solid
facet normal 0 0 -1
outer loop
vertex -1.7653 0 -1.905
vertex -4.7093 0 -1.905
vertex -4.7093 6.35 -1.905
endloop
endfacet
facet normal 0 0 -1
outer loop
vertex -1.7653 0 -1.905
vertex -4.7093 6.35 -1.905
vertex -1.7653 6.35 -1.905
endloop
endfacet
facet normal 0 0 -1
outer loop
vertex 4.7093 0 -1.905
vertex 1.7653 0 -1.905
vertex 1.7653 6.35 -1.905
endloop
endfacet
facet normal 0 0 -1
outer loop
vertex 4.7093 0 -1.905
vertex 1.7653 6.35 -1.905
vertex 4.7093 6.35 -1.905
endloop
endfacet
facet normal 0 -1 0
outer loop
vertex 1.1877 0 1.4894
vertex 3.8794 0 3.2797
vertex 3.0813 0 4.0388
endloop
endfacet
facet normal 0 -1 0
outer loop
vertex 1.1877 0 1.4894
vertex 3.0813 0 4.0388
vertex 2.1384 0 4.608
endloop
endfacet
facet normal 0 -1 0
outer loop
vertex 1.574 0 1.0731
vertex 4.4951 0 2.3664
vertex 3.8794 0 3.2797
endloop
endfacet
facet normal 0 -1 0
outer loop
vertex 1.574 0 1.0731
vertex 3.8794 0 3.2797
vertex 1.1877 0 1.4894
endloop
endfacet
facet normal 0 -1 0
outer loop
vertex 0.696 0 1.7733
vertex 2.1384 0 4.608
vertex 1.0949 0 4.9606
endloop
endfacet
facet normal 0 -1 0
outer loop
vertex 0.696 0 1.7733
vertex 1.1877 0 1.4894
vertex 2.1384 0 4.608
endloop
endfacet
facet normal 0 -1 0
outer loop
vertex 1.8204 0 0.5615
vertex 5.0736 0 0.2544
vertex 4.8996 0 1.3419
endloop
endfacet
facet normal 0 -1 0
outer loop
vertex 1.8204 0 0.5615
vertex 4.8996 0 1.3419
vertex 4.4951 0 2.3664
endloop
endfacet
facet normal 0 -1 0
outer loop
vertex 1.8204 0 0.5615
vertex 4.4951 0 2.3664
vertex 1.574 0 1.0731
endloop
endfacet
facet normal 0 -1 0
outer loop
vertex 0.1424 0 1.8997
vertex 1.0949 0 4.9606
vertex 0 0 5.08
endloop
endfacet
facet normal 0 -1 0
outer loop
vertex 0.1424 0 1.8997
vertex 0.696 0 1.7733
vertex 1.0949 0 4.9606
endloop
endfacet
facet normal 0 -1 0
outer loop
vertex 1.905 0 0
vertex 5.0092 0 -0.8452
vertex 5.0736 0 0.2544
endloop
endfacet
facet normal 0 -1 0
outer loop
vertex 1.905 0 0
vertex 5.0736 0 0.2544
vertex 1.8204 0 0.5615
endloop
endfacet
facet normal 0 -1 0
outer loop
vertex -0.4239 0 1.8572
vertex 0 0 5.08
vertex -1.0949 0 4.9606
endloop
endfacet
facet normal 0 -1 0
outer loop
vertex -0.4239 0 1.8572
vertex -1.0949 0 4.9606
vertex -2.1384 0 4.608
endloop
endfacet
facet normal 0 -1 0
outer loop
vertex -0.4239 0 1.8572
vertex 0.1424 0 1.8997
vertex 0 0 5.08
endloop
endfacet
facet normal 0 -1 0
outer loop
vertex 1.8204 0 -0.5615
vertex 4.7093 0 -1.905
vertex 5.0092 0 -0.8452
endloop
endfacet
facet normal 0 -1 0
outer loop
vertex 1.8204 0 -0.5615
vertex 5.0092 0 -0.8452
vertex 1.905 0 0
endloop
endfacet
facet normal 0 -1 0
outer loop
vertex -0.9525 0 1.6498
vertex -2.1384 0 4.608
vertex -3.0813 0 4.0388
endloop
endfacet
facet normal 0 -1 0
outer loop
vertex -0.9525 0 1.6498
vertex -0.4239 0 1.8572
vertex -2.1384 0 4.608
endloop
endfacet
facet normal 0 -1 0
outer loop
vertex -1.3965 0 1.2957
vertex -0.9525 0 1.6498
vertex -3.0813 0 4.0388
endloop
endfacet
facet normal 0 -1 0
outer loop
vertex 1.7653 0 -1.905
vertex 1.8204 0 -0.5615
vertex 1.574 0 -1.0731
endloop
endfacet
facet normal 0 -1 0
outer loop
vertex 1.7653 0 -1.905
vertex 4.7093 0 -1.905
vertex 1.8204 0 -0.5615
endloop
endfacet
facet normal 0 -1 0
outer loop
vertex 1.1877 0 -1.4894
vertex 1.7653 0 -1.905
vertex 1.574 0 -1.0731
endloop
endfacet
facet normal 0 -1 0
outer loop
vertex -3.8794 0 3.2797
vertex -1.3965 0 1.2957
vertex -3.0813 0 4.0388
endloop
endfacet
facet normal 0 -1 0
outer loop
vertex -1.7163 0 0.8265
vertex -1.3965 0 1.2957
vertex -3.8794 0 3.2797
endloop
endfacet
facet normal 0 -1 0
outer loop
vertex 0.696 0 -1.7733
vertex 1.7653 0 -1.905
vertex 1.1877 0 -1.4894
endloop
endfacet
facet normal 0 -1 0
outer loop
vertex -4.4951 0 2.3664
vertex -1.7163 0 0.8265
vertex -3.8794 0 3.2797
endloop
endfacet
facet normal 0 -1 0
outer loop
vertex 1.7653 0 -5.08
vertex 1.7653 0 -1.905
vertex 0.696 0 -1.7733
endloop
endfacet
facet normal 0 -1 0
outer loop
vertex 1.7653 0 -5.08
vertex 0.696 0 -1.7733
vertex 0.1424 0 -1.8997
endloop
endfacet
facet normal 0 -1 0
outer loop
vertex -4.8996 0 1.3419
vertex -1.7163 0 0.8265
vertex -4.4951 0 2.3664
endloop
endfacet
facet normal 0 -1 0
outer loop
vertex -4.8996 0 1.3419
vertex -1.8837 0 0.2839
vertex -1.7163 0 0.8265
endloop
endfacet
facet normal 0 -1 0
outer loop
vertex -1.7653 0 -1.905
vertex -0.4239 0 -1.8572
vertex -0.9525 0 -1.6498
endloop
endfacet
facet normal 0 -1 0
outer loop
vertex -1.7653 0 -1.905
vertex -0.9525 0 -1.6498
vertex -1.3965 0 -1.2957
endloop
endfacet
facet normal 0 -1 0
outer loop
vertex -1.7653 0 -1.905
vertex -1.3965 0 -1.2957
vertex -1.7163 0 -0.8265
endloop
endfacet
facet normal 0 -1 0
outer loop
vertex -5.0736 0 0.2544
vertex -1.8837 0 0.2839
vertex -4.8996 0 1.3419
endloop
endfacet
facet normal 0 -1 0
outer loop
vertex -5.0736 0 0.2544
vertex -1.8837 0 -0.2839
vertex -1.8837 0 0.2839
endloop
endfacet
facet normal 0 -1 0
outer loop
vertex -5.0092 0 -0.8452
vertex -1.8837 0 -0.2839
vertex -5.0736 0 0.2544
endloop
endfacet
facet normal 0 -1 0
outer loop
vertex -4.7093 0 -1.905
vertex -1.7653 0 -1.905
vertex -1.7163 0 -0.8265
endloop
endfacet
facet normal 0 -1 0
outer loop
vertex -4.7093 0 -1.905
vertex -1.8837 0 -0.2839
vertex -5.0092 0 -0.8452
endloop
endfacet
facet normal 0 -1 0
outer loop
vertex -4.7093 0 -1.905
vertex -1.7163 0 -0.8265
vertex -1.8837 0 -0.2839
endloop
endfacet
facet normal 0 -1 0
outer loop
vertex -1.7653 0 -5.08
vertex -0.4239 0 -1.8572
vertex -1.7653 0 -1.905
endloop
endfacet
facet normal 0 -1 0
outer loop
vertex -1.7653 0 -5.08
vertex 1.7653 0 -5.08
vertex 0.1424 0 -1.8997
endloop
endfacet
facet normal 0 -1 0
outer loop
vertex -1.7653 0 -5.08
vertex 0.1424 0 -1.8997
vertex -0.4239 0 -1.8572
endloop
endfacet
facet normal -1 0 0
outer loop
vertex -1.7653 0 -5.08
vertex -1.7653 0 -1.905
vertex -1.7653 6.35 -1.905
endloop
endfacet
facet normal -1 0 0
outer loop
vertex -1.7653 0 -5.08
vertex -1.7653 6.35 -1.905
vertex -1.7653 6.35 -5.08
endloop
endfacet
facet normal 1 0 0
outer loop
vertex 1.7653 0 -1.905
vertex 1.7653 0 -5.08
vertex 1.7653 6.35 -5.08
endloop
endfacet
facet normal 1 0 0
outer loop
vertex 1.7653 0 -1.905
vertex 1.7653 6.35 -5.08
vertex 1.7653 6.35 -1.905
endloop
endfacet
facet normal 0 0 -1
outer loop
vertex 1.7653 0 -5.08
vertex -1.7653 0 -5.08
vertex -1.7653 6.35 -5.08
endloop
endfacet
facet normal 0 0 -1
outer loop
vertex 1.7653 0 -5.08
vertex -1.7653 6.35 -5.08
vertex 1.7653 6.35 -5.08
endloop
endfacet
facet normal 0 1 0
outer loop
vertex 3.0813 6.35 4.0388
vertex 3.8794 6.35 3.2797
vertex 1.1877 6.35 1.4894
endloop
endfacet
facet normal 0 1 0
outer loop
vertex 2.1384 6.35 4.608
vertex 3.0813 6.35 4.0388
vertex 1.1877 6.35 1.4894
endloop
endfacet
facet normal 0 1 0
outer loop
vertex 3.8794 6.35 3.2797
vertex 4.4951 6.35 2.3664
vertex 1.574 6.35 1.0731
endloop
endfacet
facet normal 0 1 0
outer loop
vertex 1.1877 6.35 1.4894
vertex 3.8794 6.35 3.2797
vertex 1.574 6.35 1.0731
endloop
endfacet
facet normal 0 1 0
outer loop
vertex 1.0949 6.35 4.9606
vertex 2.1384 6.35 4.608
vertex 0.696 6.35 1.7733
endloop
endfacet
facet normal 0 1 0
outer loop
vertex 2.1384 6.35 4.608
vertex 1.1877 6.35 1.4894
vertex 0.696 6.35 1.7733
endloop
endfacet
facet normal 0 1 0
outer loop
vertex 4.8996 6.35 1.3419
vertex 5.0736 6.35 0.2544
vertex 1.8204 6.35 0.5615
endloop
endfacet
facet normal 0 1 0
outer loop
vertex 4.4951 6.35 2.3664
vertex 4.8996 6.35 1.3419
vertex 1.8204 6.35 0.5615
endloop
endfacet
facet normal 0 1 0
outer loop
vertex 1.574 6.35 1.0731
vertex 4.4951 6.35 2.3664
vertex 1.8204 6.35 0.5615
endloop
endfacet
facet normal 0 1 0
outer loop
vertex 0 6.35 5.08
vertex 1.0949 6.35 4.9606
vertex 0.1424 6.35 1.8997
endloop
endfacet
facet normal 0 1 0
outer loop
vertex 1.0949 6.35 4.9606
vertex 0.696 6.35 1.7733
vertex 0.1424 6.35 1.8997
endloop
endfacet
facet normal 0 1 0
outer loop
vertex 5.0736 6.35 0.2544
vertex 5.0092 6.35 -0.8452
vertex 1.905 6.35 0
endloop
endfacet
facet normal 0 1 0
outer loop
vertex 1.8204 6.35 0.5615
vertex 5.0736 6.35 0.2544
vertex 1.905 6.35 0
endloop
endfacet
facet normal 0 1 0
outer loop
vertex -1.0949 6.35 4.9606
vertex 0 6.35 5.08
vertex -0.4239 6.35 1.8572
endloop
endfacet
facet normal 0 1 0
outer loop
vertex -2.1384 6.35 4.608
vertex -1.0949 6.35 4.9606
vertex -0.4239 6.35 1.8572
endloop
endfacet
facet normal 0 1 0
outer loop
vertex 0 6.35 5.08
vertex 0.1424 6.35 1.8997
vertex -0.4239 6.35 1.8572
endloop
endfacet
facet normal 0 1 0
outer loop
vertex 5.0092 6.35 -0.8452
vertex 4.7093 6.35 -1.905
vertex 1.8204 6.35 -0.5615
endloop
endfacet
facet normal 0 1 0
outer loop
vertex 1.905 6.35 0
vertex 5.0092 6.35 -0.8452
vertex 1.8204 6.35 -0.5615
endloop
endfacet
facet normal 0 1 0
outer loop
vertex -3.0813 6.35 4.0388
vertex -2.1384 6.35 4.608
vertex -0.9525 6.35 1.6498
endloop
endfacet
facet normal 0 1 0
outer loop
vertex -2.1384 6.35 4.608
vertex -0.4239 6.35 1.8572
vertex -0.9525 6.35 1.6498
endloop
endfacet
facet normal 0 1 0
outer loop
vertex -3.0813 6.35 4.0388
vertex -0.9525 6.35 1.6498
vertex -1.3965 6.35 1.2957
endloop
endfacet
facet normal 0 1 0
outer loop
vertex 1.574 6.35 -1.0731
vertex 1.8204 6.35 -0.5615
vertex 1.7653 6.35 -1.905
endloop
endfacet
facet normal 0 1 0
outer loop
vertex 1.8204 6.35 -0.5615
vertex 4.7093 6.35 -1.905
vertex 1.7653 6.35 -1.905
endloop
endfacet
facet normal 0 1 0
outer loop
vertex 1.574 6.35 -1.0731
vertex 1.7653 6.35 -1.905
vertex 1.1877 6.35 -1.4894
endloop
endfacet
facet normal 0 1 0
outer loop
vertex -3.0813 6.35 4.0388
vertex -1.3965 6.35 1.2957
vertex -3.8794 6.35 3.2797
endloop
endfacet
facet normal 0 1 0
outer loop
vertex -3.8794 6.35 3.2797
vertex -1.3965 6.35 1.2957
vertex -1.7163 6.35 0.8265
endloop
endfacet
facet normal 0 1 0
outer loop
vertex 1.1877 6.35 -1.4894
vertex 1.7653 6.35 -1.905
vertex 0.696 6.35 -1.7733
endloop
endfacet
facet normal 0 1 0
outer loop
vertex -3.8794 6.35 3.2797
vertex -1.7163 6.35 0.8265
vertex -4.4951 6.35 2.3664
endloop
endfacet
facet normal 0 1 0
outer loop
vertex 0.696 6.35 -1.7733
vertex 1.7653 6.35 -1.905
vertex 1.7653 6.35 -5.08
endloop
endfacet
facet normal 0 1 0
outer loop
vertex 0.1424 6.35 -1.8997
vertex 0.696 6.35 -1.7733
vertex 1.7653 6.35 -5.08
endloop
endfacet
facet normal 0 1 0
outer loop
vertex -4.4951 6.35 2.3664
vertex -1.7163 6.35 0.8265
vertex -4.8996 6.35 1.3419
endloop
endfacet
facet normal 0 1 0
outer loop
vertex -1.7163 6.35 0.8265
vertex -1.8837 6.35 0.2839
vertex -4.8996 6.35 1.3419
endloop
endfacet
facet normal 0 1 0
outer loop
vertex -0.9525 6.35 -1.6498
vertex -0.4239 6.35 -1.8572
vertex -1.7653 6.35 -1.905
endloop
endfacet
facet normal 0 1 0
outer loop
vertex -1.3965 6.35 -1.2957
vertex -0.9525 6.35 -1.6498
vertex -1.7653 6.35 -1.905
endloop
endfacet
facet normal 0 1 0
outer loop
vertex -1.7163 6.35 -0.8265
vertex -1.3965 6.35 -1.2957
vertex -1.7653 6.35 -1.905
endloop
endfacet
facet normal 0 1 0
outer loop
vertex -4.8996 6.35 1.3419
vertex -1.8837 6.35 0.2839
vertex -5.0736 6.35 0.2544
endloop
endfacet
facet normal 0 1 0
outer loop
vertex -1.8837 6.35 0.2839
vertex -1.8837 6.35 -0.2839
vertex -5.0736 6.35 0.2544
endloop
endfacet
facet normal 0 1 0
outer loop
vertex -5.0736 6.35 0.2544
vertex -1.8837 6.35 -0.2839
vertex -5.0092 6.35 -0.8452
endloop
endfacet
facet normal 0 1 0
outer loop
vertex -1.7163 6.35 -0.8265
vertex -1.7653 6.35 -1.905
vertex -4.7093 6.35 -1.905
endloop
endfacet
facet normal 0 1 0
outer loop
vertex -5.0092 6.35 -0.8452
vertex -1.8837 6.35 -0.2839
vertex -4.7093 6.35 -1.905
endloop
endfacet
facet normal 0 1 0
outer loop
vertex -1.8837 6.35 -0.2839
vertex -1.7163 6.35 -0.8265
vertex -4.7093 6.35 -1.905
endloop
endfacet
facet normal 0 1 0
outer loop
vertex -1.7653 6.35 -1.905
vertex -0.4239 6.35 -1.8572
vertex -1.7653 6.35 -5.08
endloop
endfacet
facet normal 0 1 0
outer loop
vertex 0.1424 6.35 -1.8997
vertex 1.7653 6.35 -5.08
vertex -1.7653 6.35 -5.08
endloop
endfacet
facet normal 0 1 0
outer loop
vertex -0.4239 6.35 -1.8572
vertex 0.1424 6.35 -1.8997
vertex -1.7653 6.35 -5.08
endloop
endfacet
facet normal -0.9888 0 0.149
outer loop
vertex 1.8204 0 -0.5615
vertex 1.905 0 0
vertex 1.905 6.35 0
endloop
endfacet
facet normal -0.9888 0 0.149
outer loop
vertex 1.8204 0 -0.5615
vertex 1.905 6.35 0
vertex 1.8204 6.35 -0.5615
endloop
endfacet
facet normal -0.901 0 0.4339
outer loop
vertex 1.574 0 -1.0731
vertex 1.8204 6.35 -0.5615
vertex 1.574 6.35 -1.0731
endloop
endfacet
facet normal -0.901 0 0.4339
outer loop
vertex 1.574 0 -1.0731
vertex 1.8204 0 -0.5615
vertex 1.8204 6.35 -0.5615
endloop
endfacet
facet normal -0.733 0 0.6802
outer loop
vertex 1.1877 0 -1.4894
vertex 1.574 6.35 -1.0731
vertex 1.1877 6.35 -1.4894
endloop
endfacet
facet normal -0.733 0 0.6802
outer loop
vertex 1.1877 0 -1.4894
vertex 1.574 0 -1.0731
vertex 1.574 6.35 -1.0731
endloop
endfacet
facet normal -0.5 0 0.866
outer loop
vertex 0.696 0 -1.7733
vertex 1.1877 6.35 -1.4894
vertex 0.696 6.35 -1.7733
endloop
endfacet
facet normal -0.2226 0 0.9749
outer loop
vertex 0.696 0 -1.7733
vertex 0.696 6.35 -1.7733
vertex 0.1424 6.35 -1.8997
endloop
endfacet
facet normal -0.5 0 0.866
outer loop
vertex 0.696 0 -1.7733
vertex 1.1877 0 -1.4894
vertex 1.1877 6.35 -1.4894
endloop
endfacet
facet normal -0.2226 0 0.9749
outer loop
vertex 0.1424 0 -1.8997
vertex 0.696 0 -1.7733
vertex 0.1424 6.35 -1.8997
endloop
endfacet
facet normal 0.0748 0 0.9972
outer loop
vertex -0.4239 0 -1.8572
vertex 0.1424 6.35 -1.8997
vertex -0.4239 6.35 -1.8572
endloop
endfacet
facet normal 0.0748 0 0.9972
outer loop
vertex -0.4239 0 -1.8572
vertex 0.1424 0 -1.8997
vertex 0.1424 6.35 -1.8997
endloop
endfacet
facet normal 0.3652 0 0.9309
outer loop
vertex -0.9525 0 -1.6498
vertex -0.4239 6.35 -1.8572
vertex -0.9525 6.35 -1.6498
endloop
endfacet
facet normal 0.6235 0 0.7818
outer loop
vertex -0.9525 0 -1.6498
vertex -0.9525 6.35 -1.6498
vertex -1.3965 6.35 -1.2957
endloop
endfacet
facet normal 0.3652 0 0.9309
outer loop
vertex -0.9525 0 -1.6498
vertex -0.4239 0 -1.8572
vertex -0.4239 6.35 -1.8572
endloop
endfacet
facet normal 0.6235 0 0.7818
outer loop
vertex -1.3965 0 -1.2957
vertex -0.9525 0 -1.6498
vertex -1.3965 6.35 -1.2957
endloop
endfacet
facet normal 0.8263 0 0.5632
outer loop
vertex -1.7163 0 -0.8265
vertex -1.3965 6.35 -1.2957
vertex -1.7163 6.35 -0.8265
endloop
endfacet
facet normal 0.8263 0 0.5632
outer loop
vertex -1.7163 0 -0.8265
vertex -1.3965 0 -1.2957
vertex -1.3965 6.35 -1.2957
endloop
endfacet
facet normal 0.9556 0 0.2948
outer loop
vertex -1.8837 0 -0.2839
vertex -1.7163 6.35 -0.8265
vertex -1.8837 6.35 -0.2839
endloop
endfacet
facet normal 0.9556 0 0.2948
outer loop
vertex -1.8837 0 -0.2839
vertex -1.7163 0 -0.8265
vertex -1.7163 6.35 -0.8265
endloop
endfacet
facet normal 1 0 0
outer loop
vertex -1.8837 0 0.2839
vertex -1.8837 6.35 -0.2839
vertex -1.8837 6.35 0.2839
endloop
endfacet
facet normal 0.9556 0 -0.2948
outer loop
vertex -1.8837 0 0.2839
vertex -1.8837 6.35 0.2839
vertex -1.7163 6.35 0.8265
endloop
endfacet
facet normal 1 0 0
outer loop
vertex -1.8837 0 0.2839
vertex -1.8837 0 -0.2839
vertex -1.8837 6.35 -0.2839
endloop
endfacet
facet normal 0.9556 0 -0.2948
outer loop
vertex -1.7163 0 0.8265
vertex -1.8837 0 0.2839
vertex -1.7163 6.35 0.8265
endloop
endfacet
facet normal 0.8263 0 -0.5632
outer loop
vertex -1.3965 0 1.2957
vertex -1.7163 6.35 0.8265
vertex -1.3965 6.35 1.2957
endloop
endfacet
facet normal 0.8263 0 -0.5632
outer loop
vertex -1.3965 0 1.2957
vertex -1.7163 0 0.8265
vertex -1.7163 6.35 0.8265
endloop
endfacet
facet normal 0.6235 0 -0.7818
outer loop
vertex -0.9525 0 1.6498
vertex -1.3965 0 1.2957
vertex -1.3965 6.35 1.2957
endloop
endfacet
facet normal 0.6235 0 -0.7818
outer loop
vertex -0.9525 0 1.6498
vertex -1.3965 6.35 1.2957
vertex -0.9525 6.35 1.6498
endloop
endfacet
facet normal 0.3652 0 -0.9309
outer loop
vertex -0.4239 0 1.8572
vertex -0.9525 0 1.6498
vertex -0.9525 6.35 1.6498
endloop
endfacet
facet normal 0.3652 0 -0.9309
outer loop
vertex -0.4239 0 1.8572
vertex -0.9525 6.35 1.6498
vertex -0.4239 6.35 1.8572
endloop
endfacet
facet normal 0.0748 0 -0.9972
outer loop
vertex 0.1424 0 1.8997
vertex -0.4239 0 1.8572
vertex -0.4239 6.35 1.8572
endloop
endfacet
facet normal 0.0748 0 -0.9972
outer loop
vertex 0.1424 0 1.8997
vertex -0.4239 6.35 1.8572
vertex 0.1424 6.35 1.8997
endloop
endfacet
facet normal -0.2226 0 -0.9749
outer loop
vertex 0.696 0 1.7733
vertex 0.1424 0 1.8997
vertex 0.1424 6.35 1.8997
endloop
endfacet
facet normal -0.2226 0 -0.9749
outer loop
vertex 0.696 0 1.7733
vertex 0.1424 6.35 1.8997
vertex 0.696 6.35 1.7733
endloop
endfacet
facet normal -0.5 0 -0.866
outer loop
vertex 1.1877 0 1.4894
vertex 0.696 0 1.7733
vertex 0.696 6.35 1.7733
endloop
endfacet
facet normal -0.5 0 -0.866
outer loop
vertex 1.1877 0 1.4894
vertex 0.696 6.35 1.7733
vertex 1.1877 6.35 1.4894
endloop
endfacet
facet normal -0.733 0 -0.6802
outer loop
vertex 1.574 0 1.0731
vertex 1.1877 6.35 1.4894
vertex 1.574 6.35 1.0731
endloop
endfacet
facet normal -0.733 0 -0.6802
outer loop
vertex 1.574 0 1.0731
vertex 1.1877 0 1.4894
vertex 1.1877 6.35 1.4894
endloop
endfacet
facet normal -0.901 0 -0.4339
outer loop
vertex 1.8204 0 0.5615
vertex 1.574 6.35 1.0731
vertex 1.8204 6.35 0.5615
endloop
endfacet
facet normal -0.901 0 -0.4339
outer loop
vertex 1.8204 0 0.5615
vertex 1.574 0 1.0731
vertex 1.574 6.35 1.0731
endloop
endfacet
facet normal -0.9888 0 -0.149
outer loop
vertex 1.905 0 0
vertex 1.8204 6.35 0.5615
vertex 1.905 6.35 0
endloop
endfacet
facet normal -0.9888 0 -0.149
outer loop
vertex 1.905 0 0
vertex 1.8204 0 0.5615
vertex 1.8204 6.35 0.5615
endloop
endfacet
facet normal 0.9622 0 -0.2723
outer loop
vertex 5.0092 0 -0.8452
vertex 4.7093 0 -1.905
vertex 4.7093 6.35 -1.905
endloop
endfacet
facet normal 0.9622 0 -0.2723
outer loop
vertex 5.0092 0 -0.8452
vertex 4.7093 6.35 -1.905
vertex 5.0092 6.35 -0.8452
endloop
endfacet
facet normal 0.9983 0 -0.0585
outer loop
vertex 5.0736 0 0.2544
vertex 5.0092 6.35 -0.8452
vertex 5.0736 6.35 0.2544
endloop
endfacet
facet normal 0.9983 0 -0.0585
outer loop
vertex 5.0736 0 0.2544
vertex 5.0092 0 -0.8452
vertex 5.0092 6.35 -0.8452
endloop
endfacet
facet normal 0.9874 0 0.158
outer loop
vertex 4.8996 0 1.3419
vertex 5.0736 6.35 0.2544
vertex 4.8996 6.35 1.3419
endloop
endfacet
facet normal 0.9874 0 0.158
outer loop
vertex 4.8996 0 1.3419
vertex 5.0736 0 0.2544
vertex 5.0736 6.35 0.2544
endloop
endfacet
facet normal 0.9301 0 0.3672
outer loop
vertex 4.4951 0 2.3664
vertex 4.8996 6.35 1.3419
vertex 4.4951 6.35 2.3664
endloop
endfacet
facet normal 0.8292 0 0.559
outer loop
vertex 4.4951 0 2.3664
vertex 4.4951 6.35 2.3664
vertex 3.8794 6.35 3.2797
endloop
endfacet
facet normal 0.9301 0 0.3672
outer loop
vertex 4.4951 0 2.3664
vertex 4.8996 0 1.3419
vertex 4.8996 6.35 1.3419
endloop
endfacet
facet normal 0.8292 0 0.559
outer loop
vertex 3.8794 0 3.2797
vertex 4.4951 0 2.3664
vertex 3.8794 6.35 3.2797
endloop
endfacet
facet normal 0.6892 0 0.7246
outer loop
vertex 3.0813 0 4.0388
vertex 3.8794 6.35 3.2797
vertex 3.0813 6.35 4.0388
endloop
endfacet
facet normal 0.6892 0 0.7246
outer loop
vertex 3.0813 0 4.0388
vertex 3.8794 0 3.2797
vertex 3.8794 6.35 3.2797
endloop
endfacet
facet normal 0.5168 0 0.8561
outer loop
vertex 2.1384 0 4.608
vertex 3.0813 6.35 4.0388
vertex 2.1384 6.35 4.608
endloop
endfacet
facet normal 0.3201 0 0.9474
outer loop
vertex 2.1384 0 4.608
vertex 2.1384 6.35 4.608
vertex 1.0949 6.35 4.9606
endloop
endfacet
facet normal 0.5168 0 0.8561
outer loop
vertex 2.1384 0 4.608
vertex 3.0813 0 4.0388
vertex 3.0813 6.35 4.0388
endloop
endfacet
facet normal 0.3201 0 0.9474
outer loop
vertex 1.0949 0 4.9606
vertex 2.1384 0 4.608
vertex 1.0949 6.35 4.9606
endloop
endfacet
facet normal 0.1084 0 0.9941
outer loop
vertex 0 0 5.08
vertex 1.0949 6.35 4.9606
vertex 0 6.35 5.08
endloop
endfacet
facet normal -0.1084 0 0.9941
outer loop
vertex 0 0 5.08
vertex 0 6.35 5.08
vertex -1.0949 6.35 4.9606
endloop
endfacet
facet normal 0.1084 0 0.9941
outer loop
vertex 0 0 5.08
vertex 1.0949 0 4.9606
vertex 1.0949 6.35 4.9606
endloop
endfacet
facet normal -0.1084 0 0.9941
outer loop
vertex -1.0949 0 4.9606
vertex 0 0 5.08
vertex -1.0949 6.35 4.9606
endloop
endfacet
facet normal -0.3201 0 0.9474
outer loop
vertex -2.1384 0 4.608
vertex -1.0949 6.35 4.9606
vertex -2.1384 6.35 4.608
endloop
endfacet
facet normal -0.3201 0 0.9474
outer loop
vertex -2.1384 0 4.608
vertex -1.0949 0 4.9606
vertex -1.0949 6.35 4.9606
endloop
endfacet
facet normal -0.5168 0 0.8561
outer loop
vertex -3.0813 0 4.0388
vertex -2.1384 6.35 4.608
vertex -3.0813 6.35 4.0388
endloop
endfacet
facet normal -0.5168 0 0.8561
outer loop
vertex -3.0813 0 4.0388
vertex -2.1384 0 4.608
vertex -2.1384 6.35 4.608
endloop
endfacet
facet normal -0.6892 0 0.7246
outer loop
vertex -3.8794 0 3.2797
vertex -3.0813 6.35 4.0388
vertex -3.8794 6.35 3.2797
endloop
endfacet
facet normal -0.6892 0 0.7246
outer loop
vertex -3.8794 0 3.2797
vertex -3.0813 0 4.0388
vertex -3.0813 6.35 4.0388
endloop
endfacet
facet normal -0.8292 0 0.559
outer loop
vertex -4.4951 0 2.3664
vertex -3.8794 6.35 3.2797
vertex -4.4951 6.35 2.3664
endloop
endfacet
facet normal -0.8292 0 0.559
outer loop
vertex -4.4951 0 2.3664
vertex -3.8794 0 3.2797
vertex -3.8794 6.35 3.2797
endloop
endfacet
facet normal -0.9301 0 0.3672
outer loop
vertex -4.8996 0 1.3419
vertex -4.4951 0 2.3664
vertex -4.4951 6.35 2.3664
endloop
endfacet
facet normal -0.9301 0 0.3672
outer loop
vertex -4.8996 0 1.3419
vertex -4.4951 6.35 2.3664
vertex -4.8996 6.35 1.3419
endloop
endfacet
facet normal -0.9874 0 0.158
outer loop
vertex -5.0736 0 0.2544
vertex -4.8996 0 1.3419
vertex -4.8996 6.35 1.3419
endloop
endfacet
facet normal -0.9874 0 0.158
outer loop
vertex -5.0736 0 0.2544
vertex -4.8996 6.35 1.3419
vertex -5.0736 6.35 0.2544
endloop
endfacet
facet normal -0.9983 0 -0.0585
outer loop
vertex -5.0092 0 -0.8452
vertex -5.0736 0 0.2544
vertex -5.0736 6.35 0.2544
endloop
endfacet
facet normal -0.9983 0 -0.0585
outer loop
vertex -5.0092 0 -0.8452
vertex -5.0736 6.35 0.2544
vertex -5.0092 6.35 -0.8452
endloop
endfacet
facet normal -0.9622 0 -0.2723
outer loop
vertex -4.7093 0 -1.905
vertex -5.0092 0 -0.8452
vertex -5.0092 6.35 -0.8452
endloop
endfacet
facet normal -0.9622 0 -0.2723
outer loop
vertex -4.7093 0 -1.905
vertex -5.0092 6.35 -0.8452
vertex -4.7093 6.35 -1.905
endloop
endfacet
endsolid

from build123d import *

# Parameters (mm, degrees)
SKETCH1_R           = 1.905
BOSS_EXTRUDE1_DEPTH = 6.35


with BuildPart() as part:
    # Sketch1 → Boss-Extrude1 (new body)
    with BuildSketch(Plane(origin=(0, 0, 0), x_dir=(1, 0, 0), z_dir=(0, 1, 0))):
        with BuildLine():
            Line((-1.7653, 1.905), (-1.7653, 5.08))
            Line((-1.7653, 5.08), (1.7653, 5.08))
            Line((1.7653, 5.08), (1.7653, 1.905))
            Line((1.7653, 1.905), (4.709286039, 1.905))
            ThreePointArc((4.709286039, 1.905), (0, -5.08), (-4.709286039, 1.905))
            Line((-4.709286039, 1.905), (-1.7653, 1.905))
        make_face()
        Circle(SKETCH1_R, mode=Mode.SUBTRACT)
    extrude(amount=BOSS_EXTRUDE1_DEPTH)


solid = part.part
